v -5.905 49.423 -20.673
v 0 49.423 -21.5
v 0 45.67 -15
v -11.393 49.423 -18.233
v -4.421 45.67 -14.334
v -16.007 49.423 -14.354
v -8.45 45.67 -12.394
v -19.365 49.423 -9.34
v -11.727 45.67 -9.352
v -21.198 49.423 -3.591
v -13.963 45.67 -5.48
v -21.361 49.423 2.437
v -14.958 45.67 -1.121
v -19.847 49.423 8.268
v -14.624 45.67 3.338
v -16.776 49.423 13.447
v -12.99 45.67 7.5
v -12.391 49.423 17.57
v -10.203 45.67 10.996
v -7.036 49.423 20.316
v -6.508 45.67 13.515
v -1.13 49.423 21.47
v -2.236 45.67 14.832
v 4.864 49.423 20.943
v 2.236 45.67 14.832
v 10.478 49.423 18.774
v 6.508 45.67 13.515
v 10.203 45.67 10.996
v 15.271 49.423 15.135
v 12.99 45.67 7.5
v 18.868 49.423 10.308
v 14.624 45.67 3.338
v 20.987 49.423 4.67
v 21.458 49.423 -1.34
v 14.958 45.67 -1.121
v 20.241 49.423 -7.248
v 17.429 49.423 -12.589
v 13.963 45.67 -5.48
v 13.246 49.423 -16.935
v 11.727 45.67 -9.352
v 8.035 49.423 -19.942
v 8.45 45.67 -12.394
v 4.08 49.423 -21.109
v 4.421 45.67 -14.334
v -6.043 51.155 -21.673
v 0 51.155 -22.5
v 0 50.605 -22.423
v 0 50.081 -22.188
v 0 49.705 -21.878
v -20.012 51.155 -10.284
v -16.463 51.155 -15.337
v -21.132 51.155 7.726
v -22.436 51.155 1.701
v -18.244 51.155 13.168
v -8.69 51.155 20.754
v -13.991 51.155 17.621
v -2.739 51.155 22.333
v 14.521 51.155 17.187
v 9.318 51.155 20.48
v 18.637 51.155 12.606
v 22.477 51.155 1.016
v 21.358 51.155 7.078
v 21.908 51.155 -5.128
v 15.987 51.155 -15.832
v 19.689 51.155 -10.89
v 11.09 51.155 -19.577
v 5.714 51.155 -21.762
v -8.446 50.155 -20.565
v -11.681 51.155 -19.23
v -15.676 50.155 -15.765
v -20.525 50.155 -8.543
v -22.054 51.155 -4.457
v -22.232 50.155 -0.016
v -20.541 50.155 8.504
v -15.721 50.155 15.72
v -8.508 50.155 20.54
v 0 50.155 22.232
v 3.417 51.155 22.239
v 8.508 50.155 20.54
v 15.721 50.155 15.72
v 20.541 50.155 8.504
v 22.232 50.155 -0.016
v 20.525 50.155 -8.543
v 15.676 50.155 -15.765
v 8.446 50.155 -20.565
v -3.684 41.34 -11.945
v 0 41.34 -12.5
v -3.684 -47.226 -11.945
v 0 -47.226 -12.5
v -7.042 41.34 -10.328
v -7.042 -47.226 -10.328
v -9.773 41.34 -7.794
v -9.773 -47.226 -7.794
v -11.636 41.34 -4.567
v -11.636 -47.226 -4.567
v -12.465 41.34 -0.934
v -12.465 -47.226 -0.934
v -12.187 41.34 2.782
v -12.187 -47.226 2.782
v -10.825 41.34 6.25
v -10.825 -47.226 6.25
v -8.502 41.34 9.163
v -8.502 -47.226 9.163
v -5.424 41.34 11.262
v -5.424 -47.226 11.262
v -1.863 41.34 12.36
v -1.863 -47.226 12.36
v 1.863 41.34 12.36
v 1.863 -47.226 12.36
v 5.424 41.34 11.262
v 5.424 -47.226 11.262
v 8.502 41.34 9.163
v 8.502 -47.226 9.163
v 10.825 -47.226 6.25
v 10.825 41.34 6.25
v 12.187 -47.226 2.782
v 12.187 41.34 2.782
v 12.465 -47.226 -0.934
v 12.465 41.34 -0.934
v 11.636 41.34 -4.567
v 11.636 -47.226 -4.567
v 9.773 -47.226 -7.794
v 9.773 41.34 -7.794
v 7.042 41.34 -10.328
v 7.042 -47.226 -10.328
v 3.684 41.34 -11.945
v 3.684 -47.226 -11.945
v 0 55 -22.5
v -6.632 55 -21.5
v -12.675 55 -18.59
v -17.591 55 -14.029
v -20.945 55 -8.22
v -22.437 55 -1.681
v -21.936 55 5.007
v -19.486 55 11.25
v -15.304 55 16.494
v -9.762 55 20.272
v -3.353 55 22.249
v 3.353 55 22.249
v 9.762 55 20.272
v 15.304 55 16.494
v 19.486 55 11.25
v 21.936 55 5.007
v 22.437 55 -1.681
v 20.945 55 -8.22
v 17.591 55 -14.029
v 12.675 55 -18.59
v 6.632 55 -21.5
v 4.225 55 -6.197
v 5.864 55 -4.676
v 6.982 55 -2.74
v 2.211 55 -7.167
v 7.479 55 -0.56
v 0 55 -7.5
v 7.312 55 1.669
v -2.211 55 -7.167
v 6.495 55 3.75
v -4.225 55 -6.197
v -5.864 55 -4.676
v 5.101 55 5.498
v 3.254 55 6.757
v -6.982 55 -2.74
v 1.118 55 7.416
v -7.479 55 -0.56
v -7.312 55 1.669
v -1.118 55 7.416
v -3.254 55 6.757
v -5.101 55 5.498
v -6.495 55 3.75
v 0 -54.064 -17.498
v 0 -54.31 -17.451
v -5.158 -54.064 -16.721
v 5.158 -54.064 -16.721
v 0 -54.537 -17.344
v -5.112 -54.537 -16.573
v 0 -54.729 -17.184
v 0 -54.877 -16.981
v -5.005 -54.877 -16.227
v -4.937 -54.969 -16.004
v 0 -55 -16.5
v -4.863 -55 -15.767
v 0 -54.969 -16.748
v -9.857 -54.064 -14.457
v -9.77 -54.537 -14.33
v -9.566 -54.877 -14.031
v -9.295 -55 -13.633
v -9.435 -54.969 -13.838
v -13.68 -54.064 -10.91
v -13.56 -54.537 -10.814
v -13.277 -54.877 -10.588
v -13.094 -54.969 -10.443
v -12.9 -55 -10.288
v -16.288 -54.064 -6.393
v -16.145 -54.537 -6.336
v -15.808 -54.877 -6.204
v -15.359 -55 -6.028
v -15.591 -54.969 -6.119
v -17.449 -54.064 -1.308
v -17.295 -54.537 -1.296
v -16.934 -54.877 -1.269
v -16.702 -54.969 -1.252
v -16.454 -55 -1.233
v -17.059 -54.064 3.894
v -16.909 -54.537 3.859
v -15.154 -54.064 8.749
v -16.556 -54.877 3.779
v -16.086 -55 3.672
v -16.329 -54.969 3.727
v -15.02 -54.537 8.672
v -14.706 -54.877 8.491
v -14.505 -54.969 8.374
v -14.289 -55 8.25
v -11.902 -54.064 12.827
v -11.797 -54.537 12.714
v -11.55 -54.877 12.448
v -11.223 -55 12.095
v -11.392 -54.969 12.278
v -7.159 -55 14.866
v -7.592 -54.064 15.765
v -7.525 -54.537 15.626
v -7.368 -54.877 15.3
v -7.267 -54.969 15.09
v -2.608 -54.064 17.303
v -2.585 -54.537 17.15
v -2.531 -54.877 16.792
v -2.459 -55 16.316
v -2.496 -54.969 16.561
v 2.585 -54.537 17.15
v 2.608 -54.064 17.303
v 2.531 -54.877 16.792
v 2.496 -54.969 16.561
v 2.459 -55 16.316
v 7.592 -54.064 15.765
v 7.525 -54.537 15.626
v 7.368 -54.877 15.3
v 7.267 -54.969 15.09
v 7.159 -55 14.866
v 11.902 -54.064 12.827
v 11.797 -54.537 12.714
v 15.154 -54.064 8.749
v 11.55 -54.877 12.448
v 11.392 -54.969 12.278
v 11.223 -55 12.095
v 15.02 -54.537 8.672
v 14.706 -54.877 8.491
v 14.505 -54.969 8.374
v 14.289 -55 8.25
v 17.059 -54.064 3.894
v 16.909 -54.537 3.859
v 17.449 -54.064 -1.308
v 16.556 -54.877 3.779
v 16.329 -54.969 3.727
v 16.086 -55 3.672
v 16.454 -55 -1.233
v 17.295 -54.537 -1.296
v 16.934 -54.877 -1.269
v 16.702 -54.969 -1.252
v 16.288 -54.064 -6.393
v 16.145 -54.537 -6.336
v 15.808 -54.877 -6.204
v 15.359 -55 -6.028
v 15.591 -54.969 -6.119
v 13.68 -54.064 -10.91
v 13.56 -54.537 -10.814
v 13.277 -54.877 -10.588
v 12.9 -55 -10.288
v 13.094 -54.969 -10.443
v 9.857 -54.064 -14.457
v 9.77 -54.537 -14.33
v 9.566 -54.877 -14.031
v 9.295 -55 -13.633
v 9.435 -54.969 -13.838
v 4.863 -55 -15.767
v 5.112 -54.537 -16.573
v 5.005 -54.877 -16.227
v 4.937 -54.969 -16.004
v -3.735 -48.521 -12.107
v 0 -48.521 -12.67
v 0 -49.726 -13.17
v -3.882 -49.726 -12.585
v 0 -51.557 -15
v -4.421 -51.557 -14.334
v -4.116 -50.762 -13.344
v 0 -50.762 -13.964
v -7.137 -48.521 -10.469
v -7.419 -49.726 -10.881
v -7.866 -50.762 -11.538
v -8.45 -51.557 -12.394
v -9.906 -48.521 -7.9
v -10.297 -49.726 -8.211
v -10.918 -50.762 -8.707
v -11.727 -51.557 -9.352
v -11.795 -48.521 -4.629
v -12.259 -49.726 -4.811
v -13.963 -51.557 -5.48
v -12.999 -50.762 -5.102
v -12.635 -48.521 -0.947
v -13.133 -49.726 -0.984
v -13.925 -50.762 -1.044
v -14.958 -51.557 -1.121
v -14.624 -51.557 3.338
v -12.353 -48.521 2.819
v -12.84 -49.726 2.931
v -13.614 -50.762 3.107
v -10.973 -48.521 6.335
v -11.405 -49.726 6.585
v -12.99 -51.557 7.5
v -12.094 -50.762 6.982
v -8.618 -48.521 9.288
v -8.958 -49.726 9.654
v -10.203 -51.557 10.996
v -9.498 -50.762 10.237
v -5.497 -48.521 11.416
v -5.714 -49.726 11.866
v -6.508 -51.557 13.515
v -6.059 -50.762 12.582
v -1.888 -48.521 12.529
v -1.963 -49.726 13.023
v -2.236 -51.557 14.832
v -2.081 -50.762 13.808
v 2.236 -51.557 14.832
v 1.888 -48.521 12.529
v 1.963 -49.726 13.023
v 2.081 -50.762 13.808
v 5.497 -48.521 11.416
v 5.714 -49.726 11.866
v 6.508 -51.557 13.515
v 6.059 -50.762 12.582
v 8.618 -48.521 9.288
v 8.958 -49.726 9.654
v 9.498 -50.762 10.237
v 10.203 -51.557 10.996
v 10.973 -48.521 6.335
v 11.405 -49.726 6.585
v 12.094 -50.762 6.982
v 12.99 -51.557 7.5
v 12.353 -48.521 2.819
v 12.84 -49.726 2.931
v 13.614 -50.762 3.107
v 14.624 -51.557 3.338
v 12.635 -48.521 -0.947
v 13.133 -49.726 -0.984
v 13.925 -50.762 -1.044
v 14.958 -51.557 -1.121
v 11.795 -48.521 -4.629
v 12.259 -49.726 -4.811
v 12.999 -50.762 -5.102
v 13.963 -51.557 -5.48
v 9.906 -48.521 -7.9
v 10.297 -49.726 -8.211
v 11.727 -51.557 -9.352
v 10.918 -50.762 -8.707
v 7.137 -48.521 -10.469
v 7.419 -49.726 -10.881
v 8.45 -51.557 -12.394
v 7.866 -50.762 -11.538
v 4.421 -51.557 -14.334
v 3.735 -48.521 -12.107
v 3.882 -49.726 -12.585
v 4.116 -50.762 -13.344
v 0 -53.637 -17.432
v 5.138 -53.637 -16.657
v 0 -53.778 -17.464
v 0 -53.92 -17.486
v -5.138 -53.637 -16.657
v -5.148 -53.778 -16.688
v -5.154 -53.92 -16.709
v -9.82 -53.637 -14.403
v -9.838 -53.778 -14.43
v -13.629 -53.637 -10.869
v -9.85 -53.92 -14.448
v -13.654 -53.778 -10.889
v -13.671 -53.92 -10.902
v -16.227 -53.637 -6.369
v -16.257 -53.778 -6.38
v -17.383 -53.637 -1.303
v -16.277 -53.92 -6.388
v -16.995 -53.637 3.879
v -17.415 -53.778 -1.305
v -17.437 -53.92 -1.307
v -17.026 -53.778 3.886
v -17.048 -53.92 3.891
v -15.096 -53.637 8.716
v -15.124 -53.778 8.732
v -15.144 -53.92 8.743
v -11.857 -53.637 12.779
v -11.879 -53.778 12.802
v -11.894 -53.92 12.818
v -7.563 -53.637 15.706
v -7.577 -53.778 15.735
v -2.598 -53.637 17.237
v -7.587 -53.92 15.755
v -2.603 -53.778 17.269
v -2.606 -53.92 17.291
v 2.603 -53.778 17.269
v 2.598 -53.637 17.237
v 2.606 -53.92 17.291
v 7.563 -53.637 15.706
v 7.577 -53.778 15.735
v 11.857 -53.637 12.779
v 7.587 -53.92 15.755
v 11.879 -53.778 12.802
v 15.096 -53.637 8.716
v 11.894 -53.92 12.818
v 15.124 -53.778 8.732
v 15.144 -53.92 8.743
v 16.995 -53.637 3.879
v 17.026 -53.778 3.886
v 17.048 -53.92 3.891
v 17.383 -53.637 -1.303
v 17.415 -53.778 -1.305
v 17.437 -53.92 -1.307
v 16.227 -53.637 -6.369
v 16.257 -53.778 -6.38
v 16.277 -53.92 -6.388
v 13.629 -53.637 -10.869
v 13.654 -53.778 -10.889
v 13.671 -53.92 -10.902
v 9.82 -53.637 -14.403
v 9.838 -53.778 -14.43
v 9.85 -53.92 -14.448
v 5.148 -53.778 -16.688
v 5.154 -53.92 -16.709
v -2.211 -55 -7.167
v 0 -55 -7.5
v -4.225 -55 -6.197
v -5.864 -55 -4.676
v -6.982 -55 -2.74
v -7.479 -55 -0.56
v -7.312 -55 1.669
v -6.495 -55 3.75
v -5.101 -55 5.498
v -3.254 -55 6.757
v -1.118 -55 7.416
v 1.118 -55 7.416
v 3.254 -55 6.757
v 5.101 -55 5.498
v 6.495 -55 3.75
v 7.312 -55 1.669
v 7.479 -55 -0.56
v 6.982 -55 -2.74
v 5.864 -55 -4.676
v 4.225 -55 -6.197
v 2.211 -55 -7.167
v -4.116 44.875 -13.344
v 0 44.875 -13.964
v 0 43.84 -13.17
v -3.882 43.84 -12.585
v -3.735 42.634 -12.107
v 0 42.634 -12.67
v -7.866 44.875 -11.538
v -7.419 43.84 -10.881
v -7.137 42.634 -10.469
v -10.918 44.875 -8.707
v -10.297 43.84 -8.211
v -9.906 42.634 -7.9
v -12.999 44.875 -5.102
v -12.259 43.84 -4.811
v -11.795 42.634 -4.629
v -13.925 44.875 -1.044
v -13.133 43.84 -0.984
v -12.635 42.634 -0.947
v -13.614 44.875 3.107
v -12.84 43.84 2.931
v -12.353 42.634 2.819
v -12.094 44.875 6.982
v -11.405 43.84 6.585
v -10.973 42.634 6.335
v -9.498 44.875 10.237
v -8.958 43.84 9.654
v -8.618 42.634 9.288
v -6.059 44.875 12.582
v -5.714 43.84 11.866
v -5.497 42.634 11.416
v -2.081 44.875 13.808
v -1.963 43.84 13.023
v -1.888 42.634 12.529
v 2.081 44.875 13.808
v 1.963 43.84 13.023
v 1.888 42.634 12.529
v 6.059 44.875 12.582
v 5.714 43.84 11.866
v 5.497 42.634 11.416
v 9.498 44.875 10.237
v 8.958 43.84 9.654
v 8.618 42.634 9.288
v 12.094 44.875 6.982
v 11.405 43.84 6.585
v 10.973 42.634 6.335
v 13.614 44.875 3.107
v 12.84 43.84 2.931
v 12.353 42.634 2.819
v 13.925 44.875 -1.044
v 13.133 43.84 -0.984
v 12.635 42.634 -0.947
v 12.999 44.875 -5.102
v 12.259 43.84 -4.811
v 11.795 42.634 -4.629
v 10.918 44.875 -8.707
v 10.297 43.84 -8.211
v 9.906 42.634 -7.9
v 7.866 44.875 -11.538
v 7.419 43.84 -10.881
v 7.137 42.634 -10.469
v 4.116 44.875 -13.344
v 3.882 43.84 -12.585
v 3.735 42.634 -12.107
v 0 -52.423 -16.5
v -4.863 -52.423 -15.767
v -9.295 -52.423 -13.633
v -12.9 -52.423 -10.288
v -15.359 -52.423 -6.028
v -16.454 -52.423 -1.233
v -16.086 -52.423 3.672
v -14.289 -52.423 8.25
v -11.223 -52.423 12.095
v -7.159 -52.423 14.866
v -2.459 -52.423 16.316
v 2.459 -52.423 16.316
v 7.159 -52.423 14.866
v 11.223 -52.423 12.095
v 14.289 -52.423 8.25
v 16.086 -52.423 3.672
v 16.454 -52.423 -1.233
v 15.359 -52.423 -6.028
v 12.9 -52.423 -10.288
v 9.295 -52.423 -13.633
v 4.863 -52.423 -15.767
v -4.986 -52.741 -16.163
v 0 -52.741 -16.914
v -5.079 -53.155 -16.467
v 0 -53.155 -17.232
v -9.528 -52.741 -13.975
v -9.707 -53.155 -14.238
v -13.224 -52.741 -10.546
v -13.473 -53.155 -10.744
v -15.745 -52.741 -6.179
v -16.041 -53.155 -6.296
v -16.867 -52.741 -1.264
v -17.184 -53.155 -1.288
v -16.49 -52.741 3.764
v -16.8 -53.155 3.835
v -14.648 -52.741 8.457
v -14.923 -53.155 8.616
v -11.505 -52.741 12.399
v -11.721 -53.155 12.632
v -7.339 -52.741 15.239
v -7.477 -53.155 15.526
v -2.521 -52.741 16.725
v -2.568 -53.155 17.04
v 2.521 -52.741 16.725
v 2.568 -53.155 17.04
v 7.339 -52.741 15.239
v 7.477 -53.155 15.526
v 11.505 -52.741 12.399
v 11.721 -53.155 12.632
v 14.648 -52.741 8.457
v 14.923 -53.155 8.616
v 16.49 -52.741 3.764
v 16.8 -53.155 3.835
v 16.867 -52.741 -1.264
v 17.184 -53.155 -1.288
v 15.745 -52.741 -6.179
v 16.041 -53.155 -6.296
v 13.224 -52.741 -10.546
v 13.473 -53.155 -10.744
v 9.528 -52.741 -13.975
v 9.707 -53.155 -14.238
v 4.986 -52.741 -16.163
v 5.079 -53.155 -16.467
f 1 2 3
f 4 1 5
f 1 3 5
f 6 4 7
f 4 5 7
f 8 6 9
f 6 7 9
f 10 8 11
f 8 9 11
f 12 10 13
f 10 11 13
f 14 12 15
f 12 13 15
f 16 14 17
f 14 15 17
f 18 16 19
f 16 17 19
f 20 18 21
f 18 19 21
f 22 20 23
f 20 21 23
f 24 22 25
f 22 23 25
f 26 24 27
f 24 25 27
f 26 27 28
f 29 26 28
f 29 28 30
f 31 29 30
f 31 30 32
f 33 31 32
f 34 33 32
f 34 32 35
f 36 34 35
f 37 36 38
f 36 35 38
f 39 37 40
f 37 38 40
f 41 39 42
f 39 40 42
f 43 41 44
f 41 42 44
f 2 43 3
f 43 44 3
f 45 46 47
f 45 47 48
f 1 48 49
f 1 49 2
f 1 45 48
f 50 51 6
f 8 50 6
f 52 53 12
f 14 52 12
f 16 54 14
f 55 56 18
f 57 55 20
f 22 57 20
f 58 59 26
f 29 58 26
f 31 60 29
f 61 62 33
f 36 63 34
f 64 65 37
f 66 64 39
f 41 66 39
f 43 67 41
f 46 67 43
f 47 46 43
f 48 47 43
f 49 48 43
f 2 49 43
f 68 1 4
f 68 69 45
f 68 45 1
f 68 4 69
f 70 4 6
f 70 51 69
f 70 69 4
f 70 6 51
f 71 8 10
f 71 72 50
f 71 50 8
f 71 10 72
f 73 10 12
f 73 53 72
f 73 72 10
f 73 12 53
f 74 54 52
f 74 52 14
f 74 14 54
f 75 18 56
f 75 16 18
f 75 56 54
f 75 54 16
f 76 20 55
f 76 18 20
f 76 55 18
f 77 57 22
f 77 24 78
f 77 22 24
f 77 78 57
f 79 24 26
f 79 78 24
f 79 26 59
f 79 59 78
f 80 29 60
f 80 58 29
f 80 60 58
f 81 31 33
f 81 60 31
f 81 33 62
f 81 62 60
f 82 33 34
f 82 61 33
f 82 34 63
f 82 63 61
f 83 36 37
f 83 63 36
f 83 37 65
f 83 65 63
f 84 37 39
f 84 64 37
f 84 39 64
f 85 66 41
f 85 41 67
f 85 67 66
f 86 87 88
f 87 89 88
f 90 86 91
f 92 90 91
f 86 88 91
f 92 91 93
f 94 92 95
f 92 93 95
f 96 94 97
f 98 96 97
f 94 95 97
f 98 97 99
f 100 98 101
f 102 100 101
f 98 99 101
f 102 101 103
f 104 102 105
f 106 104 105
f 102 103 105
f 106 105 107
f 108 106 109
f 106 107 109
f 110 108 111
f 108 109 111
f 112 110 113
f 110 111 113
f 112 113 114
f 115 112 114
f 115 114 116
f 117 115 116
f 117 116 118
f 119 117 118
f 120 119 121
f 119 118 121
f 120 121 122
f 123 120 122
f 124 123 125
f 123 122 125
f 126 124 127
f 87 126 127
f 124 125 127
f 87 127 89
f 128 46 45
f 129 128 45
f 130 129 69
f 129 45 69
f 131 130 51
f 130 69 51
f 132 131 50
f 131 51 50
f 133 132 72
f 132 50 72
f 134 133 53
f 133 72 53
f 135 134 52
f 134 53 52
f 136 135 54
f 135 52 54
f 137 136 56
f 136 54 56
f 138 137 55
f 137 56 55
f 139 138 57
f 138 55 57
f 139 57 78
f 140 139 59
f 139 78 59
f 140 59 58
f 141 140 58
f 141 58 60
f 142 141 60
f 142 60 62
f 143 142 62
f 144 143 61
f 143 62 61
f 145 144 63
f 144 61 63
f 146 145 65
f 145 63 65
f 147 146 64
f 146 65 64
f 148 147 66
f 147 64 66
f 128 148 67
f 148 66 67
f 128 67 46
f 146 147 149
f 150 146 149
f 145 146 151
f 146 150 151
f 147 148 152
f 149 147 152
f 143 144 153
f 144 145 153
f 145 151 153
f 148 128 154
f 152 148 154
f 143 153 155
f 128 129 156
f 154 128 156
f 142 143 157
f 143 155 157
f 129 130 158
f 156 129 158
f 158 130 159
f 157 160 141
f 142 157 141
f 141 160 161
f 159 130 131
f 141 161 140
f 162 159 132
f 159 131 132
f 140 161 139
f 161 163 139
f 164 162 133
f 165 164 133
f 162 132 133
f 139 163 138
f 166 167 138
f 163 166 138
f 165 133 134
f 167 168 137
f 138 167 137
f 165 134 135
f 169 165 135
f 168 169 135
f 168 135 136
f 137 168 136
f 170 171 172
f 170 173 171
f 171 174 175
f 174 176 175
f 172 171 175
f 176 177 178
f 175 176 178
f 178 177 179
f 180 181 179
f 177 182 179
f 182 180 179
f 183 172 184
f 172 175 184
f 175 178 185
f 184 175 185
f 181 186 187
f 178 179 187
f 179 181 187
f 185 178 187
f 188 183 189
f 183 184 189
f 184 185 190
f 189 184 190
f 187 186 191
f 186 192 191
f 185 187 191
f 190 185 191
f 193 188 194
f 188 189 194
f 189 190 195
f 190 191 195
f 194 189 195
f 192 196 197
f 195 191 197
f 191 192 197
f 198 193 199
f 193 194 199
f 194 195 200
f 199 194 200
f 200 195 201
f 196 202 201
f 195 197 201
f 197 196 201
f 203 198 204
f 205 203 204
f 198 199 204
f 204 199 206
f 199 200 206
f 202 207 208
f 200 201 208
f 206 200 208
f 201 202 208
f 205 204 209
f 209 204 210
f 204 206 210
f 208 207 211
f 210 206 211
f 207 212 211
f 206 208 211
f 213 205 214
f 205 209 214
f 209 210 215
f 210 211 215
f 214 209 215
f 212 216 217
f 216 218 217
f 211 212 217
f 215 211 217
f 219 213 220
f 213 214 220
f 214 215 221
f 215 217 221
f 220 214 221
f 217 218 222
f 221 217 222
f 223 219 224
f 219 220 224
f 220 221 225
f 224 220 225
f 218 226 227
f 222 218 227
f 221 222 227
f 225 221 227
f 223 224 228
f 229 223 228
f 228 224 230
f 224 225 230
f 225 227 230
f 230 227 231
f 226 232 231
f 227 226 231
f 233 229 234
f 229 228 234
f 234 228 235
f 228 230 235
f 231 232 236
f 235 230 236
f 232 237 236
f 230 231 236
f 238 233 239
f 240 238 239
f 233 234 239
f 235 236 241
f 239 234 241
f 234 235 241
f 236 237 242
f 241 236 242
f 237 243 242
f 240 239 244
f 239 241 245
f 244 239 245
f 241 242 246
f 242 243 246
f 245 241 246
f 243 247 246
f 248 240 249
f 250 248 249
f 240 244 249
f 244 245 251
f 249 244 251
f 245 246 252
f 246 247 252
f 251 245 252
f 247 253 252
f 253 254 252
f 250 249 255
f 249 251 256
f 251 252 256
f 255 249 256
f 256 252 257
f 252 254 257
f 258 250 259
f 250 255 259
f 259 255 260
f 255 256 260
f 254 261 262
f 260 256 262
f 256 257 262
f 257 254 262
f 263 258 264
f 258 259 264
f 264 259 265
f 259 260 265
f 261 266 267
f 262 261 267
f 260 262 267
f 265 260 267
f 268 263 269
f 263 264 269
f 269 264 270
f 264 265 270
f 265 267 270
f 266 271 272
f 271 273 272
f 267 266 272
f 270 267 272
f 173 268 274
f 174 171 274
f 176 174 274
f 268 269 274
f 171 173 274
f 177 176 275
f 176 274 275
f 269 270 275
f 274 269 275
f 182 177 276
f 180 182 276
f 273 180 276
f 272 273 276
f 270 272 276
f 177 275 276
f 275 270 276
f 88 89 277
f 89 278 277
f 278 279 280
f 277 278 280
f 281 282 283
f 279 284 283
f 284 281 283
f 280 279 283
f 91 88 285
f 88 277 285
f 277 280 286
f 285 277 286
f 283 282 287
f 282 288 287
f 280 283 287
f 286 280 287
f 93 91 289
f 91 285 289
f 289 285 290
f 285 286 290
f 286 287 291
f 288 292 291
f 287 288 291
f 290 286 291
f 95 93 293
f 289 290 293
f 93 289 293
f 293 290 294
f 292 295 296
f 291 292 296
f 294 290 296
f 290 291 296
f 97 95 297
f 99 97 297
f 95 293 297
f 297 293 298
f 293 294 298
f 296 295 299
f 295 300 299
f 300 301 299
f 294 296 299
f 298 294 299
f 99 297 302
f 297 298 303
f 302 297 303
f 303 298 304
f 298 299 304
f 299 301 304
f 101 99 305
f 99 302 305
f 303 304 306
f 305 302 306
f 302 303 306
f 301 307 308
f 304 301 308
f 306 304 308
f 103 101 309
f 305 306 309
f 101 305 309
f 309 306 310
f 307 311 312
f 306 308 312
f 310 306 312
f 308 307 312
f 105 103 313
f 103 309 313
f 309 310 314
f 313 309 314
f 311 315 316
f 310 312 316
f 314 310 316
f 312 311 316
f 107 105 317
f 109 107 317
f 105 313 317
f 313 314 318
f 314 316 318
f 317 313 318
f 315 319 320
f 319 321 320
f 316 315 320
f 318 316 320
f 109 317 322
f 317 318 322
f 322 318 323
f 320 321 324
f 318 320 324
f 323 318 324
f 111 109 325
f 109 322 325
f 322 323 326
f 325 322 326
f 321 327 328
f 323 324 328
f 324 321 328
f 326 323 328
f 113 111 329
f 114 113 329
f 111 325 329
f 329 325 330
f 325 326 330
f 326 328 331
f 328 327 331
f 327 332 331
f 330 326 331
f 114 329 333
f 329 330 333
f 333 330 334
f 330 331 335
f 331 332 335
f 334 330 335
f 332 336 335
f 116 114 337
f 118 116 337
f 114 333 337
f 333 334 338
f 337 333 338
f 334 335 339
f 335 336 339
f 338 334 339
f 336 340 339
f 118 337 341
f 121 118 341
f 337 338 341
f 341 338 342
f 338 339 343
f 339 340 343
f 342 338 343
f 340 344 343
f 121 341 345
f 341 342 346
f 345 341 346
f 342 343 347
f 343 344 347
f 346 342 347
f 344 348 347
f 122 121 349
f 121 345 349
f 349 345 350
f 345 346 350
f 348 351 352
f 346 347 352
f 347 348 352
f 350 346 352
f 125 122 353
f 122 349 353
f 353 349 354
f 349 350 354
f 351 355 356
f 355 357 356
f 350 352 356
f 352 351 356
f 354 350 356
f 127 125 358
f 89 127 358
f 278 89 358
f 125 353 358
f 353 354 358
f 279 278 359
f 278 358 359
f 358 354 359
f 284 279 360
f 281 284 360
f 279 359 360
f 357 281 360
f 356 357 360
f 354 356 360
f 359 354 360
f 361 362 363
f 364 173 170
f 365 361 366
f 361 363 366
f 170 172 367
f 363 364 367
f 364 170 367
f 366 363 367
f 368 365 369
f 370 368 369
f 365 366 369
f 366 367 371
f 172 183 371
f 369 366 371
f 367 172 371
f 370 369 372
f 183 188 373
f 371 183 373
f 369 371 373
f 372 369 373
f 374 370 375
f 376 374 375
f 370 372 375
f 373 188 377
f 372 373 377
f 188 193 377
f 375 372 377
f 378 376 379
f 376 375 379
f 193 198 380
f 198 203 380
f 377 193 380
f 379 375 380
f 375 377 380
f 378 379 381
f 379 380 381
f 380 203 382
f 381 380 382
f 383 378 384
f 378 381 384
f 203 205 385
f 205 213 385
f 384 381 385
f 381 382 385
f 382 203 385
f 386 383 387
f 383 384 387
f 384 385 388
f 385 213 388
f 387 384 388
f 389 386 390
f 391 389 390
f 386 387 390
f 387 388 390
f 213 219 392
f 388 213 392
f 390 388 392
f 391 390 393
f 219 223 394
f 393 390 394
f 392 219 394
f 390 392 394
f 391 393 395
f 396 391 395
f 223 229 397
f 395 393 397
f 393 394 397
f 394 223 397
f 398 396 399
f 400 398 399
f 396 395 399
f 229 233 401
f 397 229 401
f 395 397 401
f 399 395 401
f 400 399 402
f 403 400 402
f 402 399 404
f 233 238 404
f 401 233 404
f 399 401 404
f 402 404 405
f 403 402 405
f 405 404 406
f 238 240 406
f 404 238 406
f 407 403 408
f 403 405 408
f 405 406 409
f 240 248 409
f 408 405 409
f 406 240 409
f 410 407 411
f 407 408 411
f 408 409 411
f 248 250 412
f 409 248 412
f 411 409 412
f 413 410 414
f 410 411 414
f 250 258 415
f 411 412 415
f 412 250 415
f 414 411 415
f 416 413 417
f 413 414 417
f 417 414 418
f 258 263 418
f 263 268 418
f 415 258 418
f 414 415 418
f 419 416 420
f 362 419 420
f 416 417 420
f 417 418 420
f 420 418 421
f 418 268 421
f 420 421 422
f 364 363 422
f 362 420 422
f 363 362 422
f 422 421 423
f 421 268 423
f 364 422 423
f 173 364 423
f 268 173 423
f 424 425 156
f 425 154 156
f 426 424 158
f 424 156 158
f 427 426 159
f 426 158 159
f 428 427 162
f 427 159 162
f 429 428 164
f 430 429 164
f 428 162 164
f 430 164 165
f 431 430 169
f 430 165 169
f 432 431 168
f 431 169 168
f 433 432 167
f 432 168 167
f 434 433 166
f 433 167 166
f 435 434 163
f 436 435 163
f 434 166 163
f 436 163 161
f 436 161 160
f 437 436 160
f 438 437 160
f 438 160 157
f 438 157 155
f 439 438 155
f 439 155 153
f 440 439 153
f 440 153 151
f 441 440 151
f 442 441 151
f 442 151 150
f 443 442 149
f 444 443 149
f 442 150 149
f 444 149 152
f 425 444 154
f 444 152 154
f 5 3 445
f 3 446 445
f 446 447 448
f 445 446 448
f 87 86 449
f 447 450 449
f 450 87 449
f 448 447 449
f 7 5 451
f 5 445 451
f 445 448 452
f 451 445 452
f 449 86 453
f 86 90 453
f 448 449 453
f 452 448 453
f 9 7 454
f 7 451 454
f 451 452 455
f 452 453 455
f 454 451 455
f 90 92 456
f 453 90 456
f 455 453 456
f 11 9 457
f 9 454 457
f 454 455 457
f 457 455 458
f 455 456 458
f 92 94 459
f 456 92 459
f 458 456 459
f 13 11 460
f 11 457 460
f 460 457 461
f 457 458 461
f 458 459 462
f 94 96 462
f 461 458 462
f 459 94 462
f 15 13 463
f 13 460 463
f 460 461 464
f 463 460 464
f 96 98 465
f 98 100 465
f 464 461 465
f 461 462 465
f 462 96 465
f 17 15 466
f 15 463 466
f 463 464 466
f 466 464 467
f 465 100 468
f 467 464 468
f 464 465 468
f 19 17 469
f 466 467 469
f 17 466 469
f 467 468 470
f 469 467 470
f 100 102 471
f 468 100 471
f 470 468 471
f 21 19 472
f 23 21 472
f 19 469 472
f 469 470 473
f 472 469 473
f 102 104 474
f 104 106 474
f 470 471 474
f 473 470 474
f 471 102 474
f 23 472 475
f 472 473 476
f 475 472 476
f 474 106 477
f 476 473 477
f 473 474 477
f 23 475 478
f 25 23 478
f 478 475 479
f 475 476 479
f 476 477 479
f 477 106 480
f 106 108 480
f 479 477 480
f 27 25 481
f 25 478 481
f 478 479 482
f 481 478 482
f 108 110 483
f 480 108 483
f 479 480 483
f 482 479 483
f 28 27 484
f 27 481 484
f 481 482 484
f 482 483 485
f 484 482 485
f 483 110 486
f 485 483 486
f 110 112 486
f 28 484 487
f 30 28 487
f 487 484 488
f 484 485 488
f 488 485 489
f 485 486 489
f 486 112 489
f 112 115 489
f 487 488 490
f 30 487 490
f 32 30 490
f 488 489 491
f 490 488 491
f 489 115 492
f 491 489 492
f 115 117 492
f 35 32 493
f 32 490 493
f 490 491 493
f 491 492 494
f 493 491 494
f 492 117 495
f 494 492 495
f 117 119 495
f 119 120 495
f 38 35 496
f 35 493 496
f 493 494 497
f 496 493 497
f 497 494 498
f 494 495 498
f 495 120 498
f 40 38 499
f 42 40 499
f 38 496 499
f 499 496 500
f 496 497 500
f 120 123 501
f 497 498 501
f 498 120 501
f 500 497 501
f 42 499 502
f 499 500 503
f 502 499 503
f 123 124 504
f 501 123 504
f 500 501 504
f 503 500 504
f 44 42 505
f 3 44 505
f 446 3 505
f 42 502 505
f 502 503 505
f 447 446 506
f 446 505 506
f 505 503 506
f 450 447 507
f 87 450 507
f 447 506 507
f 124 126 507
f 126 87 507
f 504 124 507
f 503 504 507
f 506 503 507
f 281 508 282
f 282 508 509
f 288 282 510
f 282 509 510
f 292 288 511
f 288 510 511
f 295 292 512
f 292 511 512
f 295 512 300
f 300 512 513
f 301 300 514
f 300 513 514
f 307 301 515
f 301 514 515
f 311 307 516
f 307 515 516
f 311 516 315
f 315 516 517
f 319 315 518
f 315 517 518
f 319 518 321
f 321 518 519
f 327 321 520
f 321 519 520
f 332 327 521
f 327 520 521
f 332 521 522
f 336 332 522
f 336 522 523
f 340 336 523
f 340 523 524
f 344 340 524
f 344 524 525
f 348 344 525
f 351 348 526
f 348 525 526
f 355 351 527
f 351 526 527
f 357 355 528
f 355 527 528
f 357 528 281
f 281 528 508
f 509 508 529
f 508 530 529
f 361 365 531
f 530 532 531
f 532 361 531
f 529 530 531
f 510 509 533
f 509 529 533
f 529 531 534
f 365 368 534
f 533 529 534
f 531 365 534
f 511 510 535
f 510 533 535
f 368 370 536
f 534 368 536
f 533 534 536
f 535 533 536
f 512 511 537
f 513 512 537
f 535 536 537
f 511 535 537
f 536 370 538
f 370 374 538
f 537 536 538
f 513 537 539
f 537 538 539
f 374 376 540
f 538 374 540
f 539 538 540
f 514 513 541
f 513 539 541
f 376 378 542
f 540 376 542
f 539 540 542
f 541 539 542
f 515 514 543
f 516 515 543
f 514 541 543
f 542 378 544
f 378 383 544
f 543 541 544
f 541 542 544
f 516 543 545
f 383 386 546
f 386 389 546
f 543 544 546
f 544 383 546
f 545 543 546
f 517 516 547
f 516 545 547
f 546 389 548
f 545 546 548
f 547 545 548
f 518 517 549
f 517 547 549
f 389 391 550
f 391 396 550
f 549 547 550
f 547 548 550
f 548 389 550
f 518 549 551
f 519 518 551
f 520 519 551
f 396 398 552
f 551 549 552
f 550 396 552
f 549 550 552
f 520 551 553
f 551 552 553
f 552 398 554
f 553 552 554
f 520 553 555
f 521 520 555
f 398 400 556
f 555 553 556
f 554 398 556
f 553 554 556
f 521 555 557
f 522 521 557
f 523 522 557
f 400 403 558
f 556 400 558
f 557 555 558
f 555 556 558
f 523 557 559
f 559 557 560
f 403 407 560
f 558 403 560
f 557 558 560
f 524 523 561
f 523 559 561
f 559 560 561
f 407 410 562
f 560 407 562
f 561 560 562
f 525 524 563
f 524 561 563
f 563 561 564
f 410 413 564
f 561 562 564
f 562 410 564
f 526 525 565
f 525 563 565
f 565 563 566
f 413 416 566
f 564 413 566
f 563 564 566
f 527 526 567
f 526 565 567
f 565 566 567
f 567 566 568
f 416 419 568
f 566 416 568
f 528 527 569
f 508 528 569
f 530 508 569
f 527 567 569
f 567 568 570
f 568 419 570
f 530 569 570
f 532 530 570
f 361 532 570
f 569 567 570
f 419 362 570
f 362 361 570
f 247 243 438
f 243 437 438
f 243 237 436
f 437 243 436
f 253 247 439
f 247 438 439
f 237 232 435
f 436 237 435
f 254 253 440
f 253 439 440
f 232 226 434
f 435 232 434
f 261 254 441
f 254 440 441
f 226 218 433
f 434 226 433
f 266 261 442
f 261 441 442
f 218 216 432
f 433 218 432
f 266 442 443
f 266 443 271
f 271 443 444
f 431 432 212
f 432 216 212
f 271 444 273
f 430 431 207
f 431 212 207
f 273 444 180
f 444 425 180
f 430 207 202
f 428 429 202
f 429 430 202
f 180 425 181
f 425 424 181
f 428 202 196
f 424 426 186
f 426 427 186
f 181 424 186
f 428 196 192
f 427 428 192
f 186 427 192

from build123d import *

# Parameters (mm, degrees)
FILLET1_R = 2


with BuildPart() as part:
    # Sketch1 → Revolve1 (revolve)
    with BuildSketch(Plane.YZ, mode=Mode.PRIVATE) as revolve1_sk:
        with BuildLine():
            Line((41.339745962, 12.5), (0, 12.5))
            Line((0, 12.5), (-47.226497308, 12.5))
            ThreePointArc((-47.226497308, 12.5), (-49.726497308, 13.169872981), (-51.556624327, 15))
            Line((-51.556624327, 15), (-52.422649731, 16.5))
            ThreePointArc((-52.422649731, 16.5), (-52.93730682, 17.086805764), (-53.637376906, 17.431935884))
            ThreePointArc((-53.637376906, 17.431935884), (-53.848936639, 17.476488917), (-54.064069414, 17.497945445))
            ThreePointArc((-54.064069414, 17.497945445), (-54.729407093, 17.184079888), (-55, 16.5))
            Line((-55, 16.5), (-55, 7.5))
            Line((-55, 7.5), (55, 7.5))
            Line((55, 7.5), (55, 22.5))
            Line((55, 22.5), (50, 22.5))
            Line((50, 22.5), (45.669872981, 15))
            ThreePointArc((45.669872981, 15), (43.839745962, 13.169872981), (41.339745962, 12.5))
        make_face()
    revolve(revolve1_sk.sketch.rotate(Axis((0, -16.105071473, 0), (0, 1, 0)), 180), axis=Axis((0, -16.105071473, 0), (0, 1, 0)))

    # Fillet1
    fillet1_edges = [part.edges().sort_by_distance(p)[0] for p in [
        (0, 50, 22.5),
    ]]
    fillet(fillet1_edges, radius=FILLET1_R)


solid = part.part
